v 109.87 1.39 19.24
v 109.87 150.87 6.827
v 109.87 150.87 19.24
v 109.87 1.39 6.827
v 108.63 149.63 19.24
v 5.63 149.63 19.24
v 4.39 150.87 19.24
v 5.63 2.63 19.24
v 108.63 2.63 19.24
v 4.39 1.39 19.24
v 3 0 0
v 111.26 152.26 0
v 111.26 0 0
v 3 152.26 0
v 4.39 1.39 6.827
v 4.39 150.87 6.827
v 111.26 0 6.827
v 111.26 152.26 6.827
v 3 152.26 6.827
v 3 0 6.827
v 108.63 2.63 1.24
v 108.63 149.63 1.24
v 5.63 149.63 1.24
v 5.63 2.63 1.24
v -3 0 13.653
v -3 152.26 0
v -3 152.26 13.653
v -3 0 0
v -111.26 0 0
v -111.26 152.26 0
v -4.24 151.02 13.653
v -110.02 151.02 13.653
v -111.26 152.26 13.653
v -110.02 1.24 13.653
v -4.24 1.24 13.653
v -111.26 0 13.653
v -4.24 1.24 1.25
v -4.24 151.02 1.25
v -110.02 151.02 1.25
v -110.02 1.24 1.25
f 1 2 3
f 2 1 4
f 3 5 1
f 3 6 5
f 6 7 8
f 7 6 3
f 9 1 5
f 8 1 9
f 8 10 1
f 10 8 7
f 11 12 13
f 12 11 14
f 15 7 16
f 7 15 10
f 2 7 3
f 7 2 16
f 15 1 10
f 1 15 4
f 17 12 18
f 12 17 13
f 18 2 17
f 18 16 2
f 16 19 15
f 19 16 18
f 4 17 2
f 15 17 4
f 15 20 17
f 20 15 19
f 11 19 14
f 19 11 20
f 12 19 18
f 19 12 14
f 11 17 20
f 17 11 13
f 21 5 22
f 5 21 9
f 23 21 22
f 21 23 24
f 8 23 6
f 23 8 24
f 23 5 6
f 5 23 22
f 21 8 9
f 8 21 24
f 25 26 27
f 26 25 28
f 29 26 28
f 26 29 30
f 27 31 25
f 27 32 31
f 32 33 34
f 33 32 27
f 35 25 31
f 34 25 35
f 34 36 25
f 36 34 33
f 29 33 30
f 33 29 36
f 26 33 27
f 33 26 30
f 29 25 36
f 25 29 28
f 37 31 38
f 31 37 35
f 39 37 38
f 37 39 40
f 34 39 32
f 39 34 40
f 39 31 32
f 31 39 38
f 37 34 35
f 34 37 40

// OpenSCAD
iw = 103;
il = 147;
ih = 18;
twt = 1.24;
slop = .15;
frac = 0.3333333333333333;//[0.08333333333333333:0.08333333333333333:1]
oh = ih + 2 * twt + slop;
ow = iw + 4 * twt + 2 * slop;
ol = il + 4 * twt + 2 * slop;
module bottom() {
    difference() {
        union() {
            translate([twt + slop, twt + slop, 0]) cube([iw + 2 * twt, il+ 2 * twt, ih + 1 * twt]);
            translate([0, 0, 0]) cube([ow, ol, (oh - slop) * frac]);
        }
        translate([2 * twt + slop, 2 * twt + slop, twt]) cube([iw, il, ih + .01]);
    }
}
module top() {
    difference() {
        cube([ow, ol, (oh - slop) * (1 - frac)]);
        translate([twt, twt, - .01]) cube([ow - 2 * twt, ol - 2 * twt, (oh - slop) * (1 - frac) - twt]);
    }
}

if($preview){
   difference() {
       union() {
           bottom();
           translate([0, 0, oh - (oh - slop) * (1 - frac)]) top();
       }
       translate([ow / 2, - 1, - 1]) cube(ow * 2);

       %bottom();
       %translate([0, 0, oh - (oh - slop) * (1 - frac)]) top();
   }
} else {
        translate([3,0,0]) bottom();
        translate([-ow-3,0,(oh - slop) * (1 - frac)]) mirror([0,0,1]) top();
}
